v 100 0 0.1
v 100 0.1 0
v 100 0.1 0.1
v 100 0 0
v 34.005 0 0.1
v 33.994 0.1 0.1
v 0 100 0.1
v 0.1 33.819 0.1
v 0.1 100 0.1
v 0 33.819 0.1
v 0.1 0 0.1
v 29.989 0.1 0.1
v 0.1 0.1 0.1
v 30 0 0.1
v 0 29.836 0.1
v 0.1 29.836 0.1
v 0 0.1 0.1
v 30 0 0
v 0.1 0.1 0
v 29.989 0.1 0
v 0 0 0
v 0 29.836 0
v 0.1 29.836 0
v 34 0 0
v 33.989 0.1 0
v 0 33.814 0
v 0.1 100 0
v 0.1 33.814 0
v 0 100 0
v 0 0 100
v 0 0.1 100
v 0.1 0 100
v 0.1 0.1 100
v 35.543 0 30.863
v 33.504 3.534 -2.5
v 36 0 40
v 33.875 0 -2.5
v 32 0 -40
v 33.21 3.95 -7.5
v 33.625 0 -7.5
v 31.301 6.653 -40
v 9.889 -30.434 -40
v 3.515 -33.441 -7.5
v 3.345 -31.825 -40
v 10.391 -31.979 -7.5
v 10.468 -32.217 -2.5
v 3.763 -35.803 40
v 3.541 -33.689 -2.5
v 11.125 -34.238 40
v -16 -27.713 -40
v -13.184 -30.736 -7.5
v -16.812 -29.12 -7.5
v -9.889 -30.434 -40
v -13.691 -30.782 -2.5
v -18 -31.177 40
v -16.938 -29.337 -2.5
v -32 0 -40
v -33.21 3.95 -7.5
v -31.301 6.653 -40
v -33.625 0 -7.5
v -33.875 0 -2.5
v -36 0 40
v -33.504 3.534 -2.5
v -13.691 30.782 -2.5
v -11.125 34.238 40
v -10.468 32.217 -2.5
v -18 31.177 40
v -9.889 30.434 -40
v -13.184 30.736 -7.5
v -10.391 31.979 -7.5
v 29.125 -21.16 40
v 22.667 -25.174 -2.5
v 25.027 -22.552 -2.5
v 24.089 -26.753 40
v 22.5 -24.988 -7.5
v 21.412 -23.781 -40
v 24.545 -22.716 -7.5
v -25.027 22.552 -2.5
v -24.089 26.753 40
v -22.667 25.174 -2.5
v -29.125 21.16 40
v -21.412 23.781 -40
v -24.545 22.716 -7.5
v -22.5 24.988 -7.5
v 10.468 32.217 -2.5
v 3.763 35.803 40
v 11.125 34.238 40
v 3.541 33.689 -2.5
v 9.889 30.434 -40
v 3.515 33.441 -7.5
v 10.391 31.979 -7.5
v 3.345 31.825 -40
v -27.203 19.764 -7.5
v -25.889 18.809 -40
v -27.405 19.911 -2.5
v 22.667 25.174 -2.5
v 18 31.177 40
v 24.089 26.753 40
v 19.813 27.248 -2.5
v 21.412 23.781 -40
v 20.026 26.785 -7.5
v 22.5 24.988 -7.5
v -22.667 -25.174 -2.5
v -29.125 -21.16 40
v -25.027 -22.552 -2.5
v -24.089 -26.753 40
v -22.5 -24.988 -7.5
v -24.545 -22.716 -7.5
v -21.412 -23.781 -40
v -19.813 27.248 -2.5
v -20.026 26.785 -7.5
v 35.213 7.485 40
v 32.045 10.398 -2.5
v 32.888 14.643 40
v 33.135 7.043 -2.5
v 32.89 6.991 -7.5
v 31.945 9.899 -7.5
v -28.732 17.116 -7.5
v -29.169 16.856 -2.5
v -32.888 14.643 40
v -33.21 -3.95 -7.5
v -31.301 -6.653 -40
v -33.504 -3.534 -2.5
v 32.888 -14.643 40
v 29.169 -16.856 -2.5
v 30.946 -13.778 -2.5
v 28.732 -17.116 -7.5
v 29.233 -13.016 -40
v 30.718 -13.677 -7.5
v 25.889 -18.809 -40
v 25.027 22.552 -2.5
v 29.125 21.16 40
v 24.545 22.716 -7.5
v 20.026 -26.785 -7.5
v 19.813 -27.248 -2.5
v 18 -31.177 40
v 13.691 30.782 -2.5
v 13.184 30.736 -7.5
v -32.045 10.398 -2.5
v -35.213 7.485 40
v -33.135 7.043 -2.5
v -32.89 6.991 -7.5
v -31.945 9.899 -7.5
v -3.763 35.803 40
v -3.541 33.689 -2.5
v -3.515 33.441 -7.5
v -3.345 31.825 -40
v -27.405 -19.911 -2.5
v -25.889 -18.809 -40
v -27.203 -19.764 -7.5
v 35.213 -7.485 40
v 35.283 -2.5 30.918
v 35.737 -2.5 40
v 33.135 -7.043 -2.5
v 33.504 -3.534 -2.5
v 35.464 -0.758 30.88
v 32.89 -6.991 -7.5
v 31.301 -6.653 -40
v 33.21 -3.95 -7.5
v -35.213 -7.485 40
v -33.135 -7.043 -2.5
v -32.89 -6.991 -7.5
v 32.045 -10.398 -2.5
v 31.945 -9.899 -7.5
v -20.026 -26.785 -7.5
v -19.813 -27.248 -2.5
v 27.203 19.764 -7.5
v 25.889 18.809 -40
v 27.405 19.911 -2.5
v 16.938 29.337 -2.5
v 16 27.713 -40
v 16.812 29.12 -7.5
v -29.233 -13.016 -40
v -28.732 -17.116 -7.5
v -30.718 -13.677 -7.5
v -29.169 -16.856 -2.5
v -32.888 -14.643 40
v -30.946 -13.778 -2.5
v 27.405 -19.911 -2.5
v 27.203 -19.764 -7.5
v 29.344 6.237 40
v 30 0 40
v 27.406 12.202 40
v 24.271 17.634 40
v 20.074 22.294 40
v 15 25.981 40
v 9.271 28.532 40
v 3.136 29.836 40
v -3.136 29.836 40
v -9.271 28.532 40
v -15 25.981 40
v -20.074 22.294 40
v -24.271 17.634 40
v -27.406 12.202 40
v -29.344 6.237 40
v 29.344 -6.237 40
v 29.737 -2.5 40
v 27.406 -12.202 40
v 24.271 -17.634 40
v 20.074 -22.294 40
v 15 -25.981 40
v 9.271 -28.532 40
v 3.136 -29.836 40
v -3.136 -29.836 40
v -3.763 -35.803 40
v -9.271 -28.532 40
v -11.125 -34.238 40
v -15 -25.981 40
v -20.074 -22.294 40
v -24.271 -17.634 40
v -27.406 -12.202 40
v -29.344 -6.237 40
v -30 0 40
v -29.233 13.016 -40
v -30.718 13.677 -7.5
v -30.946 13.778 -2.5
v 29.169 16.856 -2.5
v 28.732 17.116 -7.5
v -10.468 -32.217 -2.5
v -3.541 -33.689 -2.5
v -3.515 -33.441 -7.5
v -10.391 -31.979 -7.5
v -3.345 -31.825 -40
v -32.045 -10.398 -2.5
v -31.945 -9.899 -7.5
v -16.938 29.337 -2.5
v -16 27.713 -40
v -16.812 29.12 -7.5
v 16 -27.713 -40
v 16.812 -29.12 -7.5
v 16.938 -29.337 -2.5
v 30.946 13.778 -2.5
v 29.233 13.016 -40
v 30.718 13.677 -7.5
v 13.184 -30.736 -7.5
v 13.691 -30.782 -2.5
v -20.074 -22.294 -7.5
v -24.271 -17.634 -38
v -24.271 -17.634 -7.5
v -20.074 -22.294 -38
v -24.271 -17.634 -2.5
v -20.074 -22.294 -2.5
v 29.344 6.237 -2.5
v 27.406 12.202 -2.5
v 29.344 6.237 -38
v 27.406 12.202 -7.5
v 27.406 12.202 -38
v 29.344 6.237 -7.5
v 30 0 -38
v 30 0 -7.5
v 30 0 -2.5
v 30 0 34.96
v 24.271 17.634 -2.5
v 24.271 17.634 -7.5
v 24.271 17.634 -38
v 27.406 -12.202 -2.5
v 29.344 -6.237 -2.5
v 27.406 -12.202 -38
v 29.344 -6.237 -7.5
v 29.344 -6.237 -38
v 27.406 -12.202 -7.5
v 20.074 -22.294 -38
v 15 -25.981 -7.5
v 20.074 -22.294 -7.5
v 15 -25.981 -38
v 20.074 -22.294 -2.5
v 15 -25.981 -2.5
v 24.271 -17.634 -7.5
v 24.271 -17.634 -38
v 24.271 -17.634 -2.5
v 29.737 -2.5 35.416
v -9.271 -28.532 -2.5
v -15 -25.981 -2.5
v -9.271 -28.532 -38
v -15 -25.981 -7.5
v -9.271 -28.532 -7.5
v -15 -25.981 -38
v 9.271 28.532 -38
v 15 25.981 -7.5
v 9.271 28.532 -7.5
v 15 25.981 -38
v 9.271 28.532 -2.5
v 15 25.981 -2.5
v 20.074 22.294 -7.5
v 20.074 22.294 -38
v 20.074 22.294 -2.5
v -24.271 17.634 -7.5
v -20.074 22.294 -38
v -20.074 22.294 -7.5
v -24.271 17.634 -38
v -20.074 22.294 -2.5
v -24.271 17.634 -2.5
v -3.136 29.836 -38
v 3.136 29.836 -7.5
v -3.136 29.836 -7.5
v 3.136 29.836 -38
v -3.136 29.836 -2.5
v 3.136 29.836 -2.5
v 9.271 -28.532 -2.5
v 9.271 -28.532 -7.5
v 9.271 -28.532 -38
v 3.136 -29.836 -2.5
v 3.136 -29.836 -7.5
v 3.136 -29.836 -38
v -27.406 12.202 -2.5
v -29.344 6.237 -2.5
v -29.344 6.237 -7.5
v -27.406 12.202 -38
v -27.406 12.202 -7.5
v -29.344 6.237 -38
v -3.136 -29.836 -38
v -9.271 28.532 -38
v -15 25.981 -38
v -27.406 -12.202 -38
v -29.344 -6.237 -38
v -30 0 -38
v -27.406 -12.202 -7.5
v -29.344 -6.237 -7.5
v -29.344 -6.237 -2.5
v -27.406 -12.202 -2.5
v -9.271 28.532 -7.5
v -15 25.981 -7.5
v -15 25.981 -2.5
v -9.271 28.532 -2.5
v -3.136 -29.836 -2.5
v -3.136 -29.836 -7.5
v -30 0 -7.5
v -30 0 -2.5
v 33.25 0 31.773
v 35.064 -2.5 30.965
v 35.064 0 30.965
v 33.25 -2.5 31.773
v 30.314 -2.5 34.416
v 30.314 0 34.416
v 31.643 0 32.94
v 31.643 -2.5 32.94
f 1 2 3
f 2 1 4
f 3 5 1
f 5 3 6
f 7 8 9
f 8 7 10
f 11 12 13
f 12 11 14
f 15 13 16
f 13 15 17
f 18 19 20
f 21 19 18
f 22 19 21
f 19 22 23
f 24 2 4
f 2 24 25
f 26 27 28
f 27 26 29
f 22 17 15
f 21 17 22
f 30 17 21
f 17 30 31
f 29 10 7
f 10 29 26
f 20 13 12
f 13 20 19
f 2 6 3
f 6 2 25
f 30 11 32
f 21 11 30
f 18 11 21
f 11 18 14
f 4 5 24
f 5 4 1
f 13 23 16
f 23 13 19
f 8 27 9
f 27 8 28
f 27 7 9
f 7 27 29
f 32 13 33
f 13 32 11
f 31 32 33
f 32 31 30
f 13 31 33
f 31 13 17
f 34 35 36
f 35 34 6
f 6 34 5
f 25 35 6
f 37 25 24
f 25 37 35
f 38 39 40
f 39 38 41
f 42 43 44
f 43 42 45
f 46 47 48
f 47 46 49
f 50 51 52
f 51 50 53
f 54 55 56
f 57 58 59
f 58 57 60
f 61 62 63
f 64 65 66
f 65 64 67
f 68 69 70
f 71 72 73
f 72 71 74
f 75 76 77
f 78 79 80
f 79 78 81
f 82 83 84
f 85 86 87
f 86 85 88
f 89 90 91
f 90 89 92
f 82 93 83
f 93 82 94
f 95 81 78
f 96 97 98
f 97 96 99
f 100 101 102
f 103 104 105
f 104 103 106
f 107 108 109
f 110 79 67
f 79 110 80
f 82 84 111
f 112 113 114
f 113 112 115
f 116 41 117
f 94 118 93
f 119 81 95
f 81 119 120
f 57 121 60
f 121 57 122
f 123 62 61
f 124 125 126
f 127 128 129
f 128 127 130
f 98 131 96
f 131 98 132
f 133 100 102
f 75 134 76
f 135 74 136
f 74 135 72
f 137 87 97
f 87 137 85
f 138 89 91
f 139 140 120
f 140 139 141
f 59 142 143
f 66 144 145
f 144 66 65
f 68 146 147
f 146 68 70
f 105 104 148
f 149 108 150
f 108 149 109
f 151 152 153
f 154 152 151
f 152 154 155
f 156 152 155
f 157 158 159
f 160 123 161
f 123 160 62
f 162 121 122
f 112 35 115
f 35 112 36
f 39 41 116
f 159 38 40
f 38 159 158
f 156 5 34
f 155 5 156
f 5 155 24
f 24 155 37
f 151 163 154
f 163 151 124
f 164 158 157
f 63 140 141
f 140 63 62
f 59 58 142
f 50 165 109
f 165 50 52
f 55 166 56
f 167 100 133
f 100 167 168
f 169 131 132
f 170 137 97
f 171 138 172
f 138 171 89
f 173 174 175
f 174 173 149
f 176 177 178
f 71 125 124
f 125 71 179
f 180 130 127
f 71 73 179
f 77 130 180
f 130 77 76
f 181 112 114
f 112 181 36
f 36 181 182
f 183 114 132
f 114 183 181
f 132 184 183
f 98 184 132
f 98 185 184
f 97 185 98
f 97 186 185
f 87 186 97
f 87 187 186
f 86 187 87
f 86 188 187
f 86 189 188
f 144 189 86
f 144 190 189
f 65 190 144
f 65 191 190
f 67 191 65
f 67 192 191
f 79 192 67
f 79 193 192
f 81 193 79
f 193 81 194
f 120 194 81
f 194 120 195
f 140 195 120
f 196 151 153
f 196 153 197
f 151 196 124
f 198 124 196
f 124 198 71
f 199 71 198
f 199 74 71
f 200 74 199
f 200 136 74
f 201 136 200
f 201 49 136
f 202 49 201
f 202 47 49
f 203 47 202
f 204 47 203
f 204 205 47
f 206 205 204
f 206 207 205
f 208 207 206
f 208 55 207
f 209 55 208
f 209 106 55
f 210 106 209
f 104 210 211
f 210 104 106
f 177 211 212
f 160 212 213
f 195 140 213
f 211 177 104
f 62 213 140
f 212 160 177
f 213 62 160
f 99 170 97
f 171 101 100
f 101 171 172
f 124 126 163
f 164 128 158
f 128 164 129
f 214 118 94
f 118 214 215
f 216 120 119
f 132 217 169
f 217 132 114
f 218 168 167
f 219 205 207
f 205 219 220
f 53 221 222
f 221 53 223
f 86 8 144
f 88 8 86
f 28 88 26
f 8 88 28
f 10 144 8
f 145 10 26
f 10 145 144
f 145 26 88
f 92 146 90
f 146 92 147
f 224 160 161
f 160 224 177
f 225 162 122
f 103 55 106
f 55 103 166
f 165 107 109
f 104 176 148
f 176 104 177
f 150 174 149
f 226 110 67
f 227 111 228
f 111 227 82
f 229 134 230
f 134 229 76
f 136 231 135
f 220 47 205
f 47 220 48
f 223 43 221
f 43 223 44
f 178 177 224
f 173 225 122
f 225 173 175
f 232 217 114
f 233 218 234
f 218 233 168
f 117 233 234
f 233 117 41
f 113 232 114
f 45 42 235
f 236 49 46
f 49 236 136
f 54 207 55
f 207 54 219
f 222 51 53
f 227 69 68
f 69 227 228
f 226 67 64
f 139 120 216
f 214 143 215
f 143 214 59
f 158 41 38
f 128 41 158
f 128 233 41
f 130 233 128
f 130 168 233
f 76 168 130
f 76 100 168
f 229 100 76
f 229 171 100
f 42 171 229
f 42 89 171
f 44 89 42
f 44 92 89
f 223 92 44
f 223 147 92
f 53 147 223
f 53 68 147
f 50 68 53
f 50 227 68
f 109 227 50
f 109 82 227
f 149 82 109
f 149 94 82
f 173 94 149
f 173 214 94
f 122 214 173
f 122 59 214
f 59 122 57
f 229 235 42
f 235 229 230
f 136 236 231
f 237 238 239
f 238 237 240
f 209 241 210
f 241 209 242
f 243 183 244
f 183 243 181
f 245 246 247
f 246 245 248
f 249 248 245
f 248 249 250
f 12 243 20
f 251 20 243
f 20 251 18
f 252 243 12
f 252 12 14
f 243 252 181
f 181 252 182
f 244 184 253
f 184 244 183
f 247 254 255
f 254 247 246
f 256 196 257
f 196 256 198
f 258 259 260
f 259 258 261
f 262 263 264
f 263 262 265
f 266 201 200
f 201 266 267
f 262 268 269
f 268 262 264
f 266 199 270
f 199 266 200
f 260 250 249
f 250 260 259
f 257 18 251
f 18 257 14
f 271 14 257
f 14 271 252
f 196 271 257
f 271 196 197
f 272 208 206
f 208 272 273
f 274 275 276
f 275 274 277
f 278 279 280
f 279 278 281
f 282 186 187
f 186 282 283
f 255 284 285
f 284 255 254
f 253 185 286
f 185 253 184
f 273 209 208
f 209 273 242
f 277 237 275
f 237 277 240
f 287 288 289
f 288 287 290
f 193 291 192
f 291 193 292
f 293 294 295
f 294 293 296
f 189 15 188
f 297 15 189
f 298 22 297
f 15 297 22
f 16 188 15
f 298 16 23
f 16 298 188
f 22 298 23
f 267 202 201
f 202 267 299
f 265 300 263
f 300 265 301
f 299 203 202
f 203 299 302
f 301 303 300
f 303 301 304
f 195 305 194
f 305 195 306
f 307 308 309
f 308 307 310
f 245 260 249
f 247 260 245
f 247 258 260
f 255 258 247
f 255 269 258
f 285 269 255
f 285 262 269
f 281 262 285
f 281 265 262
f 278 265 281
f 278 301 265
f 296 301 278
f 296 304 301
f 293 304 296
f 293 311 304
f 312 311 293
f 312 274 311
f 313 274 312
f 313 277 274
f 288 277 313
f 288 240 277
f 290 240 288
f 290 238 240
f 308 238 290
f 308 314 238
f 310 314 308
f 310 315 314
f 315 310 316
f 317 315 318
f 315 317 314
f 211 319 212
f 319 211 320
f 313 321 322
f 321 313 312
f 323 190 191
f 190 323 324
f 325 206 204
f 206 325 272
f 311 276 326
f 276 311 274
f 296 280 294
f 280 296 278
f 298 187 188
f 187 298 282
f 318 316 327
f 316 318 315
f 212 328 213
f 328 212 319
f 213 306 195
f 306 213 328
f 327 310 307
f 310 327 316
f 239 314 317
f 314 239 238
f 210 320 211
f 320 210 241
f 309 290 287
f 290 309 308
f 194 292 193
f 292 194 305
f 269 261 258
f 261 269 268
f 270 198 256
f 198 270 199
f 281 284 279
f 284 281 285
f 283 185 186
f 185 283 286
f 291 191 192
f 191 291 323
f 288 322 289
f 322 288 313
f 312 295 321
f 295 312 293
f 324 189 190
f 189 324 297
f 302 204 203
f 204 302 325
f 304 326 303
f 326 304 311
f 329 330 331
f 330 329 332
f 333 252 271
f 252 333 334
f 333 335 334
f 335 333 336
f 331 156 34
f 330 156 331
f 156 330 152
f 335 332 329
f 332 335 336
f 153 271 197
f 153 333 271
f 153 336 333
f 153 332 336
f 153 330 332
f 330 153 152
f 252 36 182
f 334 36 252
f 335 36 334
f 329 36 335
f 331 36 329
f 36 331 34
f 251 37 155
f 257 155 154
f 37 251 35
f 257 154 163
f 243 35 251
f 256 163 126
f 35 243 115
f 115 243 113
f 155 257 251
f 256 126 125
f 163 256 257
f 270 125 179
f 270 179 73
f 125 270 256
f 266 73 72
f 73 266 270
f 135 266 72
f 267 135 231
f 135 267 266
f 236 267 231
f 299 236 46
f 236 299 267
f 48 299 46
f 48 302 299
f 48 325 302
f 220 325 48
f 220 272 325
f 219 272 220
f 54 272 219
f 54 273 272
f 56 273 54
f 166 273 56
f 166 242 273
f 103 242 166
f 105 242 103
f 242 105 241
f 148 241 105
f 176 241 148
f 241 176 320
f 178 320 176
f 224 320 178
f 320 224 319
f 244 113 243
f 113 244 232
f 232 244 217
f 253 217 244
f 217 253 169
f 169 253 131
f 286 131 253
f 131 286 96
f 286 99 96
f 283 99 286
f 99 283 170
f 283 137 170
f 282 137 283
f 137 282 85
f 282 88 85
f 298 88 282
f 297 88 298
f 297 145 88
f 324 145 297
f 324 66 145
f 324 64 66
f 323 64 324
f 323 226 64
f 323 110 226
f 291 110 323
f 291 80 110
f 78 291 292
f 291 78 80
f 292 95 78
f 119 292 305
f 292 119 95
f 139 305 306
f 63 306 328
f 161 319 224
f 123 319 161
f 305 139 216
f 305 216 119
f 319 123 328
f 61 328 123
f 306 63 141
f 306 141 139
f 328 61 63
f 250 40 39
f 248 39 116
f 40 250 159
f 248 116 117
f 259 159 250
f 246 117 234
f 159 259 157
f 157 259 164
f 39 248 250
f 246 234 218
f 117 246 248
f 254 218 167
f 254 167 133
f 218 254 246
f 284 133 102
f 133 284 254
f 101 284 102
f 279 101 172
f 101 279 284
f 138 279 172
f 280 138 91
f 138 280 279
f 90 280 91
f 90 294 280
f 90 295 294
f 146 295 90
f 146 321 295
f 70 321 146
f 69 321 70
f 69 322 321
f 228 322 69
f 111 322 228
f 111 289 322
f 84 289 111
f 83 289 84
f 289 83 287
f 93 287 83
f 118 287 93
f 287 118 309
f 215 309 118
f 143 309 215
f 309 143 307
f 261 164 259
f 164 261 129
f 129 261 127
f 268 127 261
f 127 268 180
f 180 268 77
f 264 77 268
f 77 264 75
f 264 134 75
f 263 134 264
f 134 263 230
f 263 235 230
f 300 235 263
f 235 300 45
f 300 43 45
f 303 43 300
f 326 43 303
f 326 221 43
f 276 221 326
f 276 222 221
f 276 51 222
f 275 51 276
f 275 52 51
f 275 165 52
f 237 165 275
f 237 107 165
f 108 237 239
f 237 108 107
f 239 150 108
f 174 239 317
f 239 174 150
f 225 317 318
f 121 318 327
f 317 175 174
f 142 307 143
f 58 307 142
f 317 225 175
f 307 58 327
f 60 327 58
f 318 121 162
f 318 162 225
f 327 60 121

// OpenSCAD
    // Combined Scene

    // Permanent Model
    
    // Permanent Model (Black)
    color([0, 0, 0]) {
        // Your permanent model code here
        cube([100,0.1,0.1], center = false);
        cube([0.1,100,0.1], center = false);
        cube([0.1,0.1,100], center = false);
    }
    

    // Dynamic Model
    difference() {
    // Outer mug body with wider top
    difference() {
        // Main mug shape
        cylinder(h=80, r1=32, r2=36, center=true); // Flaring top
        // Inner hollow space for the mug
        translate([0, 0, 1])
            cylinder(h=78, r=30, center=true); // Inner cylinder for fluid containment
    }
    
    // Handle of the mug
    translate([38, 0, 40])
        rotate([90, 0, 0])
            difference() {
                // Outer part of handle
                scale([1, 1, 0.5])
                    cylinder(h=10, r=9.5, center=true);

                // Inner cutout of handle
                translate([-6, -6, -5])
                    scale([1, 1, 0.5])
                        cylinder(h=20, r=8, center=true);
            }
    
    // Slightly round the base for stability
    translate([0, 0, -5])
        cylinder(h=5, r=35, center=true);
}
    
